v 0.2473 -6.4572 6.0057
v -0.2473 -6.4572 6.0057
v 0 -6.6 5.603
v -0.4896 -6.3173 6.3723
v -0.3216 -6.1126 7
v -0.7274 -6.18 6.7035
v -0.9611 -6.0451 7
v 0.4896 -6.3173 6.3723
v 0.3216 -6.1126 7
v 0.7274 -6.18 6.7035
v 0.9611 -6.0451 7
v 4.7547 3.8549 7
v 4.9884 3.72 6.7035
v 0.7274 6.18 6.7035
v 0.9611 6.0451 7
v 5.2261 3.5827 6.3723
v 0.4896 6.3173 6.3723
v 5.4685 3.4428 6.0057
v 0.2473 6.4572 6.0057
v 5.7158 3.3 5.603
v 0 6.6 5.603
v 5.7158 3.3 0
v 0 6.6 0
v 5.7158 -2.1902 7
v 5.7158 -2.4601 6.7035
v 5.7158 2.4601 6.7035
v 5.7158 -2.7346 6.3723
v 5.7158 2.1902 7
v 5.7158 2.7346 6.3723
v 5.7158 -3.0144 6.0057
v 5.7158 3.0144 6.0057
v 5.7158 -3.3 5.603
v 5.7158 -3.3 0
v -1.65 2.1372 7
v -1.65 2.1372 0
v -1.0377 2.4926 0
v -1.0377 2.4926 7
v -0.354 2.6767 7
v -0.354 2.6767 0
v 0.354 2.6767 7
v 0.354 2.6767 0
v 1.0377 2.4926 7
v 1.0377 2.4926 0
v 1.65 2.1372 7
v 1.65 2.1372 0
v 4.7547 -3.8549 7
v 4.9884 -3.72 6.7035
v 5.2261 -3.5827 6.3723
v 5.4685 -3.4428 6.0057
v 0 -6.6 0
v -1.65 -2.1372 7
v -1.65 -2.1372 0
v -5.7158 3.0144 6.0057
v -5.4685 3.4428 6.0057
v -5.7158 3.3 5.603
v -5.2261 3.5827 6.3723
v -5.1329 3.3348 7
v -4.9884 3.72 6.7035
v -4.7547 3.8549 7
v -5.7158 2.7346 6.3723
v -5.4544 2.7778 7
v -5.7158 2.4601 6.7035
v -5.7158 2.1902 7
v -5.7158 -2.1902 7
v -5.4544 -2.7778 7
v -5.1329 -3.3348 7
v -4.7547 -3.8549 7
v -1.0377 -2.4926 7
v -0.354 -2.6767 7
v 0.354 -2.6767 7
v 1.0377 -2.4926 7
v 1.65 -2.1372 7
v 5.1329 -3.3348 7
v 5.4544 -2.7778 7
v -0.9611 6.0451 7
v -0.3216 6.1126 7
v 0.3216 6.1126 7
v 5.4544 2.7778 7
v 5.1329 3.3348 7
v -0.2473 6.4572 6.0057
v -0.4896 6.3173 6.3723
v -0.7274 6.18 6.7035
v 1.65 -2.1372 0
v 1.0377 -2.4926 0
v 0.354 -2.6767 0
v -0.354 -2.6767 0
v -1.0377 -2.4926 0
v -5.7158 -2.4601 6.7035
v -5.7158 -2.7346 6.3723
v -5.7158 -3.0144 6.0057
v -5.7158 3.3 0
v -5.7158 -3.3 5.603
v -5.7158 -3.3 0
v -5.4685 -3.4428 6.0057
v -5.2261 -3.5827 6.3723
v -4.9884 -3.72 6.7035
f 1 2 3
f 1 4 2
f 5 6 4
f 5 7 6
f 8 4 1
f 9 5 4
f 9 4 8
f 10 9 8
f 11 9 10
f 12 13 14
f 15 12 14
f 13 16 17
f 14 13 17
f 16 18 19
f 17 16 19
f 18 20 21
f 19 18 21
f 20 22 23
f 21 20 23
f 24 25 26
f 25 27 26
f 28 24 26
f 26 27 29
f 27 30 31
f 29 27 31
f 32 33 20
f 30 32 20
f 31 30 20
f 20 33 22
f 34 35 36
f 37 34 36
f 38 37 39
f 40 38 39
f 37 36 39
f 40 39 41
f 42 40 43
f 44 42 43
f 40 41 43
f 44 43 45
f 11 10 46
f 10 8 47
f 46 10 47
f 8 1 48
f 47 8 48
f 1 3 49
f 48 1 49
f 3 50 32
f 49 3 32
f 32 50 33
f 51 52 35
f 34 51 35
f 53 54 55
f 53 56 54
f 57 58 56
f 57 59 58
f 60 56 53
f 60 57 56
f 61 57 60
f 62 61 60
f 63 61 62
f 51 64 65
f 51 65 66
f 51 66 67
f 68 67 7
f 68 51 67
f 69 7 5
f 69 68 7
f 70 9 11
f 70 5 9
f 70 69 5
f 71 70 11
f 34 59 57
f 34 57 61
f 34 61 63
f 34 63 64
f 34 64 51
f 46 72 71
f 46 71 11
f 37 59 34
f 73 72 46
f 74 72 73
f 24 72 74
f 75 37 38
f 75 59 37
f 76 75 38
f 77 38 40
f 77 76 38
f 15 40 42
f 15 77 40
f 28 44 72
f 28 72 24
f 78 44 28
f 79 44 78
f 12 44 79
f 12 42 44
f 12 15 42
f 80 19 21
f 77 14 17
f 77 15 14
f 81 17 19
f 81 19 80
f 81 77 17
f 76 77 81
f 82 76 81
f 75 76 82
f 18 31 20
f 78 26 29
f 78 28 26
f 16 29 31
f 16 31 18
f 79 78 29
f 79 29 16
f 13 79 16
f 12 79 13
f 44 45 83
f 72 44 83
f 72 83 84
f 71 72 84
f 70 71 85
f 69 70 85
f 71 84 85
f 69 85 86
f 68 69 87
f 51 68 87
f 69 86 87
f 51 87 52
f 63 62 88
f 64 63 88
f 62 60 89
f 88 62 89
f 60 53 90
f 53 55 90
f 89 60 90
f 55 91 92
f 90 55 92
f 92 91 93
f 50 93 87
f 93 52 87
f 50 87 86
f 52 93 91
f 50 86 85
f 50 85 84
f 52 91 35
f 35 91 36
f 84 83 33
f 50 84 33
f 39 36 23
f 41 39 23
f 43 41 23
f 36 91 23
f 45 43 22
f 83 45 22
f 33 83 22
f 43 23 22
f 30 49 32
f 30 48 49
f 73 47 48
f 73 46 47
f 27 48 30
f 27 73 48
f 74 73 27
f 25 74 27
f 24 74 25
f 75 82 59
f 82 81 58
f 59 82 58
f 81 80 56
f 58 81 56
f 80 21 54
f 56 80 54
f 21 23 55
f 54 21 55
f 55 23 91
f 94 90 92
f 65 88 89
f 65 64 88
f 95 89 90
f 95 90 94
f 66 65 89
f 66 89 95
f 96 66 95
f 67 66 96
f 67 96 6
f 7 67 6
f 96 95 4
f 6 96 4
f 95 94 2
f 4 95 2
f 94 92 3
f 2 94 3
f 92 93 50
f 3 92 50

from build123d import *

# Parameters (mm, degrees)
F1_DEPTH = 7


with BuildPart() as f1:
    # F0 (on Top) → F1 (new body)
    with BuildSketch(Plane.XY):
        Polygon((-5.715768, -3.3), (0, -6.6), (5.715768, -3.3), (5.715768, 3.3), (0, 6.6), (-5.715768, 3.3), align=None)
        with BuildLine():
            ThreePointArc((1.65, 2.137171), (2.423324, 1.190588), (2.7, 0))
            ThreePointArc((2.7, 0), (2.423324, -1.190588), (1.65, -2.137171))
            ThreePointArc((1.65, -2.137171), (0, -2.7), (-1.65, -2.137171))
            ThreePointArc((-1.65, -2.137171), (-2.7, 0), (-1.65, 2.137171))
            ThreePointArc((-1.65, 2.137171), (0, 2.7), (1.65, 2.137171))
        make_face(mode=Mode.SUBTRACT)
        with BuildLine():
            Line((-1.65, -2.137171), (-1.65, 2.137171))
            ThreePointArc((-1.65, 2.137171), (-2.7, 0), (-1.65, -2.137171))
        make_face()
        with BuildLine():
            ThreePointArc((1.65, -2.137171), (2.423324, -1.190588), (2.7, 0))
            ThreePointArc((2.7, 0), (2.423324, 1.190588), (1.65, 2.137171))
            Line((1.65, 2.137171), (1.65, -2.137171))
        make_face()
    extrude(amount=F1_DEPTH)

    # F2 (on Right) → F3 (revolve, cut)
    with BuildSketch(Plane.YZ):
        Polygon((-7.079097, 4.205731), (-5.565229, 8.62103), (-7.079097, 8.62103), align=None)
    revolve(axis=Axis((0, 0, 4.921937), (0, 0, 1)), mode=Mode.SUBTRACT)


solid = f1.part
